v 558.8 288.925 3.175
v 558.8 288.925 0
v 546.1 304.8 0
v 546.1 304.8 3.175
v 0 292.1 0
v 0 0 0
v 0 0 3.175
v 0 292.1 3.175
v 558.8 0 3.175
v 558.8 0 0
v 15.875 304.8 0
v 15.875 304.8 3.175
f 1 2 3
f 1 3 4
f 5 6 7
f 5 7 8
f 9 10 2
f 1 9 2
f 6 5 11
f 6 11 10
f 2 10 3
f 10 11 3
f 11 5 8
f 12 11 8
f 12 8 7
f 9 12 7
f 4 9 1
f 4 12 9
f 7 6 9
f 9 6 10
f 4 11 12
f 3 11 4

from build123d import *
from OCP.BRepFilletAPI import BRepFilletAPI_MakeChamfer

# Parameters (mm, degrees)
SKETCH1_W           = 558.8
SKETCH1_H           = 304.8
BOSS_EXTRUDE1_DEPTH = 3.175
CHAMFER1_SIZE       = 15.875
CHAMFER1_SIZE2      = 12.7


with BuildPart() as part:
    # Sketch1 → Boss-Extrude1 (new body)
    with BuildSketch(Plane.XY):
        with Locations((279.4, 152.4)):
            Rectangle(SKETCH1_W, SKETCH1_H)
    extrude(amount=BOSS_EXTRUDE1_DEPTH)

    # Chamfer1: one chamfer whose edges measure the first distance from different faces: ONE call of the kernel's chamfer builder (chamfer() names one face for all edges)
    chamfer1_edges_1 = [part.edges().sort_by_distance(p)[0] for p in [
        (0, 304.8, 1.5875),
    ]]
    chamfer1_side_1 = [part.faces().sort_by_distance(p)[0] for p in [
        (279.4, 304.8, 1.5875),
    ]]
    chamfer1_edges_2 = [part.edges().sort_by_distance(p)[0] for p in [
        (558.8, 304.8, 1.5875),
    ]]
    chamfer1_side_2 = [part.faces().sort_by_distance(p)[0] for p in [
        (558.8, 152.4, 1.5875),
    ]]
    chamfer1 = BRepFilletAPI_MakeChamfer(part.part.solid().wrapped)
    for e in chamfer1_edges_1:
        chamfer1.Add(CHAMFER1_SIZE, CHAMFER1_SIZE2, e.wrapped, chamfer1_side_1[0].wrapped)  # the first distance lies on this face
    for e in chamfer1_edges_2:
        chamfer1.Add(CHAMFER1_SIZE, CHAMFER1_SIZE2, e.wrapped, chamfer1_side_2[0].wrapped)  # the first distance lies on this face
    add(Compound.cast(chamfer1.Shape()), mode=Mode.REPLACE)


solid = part.part
